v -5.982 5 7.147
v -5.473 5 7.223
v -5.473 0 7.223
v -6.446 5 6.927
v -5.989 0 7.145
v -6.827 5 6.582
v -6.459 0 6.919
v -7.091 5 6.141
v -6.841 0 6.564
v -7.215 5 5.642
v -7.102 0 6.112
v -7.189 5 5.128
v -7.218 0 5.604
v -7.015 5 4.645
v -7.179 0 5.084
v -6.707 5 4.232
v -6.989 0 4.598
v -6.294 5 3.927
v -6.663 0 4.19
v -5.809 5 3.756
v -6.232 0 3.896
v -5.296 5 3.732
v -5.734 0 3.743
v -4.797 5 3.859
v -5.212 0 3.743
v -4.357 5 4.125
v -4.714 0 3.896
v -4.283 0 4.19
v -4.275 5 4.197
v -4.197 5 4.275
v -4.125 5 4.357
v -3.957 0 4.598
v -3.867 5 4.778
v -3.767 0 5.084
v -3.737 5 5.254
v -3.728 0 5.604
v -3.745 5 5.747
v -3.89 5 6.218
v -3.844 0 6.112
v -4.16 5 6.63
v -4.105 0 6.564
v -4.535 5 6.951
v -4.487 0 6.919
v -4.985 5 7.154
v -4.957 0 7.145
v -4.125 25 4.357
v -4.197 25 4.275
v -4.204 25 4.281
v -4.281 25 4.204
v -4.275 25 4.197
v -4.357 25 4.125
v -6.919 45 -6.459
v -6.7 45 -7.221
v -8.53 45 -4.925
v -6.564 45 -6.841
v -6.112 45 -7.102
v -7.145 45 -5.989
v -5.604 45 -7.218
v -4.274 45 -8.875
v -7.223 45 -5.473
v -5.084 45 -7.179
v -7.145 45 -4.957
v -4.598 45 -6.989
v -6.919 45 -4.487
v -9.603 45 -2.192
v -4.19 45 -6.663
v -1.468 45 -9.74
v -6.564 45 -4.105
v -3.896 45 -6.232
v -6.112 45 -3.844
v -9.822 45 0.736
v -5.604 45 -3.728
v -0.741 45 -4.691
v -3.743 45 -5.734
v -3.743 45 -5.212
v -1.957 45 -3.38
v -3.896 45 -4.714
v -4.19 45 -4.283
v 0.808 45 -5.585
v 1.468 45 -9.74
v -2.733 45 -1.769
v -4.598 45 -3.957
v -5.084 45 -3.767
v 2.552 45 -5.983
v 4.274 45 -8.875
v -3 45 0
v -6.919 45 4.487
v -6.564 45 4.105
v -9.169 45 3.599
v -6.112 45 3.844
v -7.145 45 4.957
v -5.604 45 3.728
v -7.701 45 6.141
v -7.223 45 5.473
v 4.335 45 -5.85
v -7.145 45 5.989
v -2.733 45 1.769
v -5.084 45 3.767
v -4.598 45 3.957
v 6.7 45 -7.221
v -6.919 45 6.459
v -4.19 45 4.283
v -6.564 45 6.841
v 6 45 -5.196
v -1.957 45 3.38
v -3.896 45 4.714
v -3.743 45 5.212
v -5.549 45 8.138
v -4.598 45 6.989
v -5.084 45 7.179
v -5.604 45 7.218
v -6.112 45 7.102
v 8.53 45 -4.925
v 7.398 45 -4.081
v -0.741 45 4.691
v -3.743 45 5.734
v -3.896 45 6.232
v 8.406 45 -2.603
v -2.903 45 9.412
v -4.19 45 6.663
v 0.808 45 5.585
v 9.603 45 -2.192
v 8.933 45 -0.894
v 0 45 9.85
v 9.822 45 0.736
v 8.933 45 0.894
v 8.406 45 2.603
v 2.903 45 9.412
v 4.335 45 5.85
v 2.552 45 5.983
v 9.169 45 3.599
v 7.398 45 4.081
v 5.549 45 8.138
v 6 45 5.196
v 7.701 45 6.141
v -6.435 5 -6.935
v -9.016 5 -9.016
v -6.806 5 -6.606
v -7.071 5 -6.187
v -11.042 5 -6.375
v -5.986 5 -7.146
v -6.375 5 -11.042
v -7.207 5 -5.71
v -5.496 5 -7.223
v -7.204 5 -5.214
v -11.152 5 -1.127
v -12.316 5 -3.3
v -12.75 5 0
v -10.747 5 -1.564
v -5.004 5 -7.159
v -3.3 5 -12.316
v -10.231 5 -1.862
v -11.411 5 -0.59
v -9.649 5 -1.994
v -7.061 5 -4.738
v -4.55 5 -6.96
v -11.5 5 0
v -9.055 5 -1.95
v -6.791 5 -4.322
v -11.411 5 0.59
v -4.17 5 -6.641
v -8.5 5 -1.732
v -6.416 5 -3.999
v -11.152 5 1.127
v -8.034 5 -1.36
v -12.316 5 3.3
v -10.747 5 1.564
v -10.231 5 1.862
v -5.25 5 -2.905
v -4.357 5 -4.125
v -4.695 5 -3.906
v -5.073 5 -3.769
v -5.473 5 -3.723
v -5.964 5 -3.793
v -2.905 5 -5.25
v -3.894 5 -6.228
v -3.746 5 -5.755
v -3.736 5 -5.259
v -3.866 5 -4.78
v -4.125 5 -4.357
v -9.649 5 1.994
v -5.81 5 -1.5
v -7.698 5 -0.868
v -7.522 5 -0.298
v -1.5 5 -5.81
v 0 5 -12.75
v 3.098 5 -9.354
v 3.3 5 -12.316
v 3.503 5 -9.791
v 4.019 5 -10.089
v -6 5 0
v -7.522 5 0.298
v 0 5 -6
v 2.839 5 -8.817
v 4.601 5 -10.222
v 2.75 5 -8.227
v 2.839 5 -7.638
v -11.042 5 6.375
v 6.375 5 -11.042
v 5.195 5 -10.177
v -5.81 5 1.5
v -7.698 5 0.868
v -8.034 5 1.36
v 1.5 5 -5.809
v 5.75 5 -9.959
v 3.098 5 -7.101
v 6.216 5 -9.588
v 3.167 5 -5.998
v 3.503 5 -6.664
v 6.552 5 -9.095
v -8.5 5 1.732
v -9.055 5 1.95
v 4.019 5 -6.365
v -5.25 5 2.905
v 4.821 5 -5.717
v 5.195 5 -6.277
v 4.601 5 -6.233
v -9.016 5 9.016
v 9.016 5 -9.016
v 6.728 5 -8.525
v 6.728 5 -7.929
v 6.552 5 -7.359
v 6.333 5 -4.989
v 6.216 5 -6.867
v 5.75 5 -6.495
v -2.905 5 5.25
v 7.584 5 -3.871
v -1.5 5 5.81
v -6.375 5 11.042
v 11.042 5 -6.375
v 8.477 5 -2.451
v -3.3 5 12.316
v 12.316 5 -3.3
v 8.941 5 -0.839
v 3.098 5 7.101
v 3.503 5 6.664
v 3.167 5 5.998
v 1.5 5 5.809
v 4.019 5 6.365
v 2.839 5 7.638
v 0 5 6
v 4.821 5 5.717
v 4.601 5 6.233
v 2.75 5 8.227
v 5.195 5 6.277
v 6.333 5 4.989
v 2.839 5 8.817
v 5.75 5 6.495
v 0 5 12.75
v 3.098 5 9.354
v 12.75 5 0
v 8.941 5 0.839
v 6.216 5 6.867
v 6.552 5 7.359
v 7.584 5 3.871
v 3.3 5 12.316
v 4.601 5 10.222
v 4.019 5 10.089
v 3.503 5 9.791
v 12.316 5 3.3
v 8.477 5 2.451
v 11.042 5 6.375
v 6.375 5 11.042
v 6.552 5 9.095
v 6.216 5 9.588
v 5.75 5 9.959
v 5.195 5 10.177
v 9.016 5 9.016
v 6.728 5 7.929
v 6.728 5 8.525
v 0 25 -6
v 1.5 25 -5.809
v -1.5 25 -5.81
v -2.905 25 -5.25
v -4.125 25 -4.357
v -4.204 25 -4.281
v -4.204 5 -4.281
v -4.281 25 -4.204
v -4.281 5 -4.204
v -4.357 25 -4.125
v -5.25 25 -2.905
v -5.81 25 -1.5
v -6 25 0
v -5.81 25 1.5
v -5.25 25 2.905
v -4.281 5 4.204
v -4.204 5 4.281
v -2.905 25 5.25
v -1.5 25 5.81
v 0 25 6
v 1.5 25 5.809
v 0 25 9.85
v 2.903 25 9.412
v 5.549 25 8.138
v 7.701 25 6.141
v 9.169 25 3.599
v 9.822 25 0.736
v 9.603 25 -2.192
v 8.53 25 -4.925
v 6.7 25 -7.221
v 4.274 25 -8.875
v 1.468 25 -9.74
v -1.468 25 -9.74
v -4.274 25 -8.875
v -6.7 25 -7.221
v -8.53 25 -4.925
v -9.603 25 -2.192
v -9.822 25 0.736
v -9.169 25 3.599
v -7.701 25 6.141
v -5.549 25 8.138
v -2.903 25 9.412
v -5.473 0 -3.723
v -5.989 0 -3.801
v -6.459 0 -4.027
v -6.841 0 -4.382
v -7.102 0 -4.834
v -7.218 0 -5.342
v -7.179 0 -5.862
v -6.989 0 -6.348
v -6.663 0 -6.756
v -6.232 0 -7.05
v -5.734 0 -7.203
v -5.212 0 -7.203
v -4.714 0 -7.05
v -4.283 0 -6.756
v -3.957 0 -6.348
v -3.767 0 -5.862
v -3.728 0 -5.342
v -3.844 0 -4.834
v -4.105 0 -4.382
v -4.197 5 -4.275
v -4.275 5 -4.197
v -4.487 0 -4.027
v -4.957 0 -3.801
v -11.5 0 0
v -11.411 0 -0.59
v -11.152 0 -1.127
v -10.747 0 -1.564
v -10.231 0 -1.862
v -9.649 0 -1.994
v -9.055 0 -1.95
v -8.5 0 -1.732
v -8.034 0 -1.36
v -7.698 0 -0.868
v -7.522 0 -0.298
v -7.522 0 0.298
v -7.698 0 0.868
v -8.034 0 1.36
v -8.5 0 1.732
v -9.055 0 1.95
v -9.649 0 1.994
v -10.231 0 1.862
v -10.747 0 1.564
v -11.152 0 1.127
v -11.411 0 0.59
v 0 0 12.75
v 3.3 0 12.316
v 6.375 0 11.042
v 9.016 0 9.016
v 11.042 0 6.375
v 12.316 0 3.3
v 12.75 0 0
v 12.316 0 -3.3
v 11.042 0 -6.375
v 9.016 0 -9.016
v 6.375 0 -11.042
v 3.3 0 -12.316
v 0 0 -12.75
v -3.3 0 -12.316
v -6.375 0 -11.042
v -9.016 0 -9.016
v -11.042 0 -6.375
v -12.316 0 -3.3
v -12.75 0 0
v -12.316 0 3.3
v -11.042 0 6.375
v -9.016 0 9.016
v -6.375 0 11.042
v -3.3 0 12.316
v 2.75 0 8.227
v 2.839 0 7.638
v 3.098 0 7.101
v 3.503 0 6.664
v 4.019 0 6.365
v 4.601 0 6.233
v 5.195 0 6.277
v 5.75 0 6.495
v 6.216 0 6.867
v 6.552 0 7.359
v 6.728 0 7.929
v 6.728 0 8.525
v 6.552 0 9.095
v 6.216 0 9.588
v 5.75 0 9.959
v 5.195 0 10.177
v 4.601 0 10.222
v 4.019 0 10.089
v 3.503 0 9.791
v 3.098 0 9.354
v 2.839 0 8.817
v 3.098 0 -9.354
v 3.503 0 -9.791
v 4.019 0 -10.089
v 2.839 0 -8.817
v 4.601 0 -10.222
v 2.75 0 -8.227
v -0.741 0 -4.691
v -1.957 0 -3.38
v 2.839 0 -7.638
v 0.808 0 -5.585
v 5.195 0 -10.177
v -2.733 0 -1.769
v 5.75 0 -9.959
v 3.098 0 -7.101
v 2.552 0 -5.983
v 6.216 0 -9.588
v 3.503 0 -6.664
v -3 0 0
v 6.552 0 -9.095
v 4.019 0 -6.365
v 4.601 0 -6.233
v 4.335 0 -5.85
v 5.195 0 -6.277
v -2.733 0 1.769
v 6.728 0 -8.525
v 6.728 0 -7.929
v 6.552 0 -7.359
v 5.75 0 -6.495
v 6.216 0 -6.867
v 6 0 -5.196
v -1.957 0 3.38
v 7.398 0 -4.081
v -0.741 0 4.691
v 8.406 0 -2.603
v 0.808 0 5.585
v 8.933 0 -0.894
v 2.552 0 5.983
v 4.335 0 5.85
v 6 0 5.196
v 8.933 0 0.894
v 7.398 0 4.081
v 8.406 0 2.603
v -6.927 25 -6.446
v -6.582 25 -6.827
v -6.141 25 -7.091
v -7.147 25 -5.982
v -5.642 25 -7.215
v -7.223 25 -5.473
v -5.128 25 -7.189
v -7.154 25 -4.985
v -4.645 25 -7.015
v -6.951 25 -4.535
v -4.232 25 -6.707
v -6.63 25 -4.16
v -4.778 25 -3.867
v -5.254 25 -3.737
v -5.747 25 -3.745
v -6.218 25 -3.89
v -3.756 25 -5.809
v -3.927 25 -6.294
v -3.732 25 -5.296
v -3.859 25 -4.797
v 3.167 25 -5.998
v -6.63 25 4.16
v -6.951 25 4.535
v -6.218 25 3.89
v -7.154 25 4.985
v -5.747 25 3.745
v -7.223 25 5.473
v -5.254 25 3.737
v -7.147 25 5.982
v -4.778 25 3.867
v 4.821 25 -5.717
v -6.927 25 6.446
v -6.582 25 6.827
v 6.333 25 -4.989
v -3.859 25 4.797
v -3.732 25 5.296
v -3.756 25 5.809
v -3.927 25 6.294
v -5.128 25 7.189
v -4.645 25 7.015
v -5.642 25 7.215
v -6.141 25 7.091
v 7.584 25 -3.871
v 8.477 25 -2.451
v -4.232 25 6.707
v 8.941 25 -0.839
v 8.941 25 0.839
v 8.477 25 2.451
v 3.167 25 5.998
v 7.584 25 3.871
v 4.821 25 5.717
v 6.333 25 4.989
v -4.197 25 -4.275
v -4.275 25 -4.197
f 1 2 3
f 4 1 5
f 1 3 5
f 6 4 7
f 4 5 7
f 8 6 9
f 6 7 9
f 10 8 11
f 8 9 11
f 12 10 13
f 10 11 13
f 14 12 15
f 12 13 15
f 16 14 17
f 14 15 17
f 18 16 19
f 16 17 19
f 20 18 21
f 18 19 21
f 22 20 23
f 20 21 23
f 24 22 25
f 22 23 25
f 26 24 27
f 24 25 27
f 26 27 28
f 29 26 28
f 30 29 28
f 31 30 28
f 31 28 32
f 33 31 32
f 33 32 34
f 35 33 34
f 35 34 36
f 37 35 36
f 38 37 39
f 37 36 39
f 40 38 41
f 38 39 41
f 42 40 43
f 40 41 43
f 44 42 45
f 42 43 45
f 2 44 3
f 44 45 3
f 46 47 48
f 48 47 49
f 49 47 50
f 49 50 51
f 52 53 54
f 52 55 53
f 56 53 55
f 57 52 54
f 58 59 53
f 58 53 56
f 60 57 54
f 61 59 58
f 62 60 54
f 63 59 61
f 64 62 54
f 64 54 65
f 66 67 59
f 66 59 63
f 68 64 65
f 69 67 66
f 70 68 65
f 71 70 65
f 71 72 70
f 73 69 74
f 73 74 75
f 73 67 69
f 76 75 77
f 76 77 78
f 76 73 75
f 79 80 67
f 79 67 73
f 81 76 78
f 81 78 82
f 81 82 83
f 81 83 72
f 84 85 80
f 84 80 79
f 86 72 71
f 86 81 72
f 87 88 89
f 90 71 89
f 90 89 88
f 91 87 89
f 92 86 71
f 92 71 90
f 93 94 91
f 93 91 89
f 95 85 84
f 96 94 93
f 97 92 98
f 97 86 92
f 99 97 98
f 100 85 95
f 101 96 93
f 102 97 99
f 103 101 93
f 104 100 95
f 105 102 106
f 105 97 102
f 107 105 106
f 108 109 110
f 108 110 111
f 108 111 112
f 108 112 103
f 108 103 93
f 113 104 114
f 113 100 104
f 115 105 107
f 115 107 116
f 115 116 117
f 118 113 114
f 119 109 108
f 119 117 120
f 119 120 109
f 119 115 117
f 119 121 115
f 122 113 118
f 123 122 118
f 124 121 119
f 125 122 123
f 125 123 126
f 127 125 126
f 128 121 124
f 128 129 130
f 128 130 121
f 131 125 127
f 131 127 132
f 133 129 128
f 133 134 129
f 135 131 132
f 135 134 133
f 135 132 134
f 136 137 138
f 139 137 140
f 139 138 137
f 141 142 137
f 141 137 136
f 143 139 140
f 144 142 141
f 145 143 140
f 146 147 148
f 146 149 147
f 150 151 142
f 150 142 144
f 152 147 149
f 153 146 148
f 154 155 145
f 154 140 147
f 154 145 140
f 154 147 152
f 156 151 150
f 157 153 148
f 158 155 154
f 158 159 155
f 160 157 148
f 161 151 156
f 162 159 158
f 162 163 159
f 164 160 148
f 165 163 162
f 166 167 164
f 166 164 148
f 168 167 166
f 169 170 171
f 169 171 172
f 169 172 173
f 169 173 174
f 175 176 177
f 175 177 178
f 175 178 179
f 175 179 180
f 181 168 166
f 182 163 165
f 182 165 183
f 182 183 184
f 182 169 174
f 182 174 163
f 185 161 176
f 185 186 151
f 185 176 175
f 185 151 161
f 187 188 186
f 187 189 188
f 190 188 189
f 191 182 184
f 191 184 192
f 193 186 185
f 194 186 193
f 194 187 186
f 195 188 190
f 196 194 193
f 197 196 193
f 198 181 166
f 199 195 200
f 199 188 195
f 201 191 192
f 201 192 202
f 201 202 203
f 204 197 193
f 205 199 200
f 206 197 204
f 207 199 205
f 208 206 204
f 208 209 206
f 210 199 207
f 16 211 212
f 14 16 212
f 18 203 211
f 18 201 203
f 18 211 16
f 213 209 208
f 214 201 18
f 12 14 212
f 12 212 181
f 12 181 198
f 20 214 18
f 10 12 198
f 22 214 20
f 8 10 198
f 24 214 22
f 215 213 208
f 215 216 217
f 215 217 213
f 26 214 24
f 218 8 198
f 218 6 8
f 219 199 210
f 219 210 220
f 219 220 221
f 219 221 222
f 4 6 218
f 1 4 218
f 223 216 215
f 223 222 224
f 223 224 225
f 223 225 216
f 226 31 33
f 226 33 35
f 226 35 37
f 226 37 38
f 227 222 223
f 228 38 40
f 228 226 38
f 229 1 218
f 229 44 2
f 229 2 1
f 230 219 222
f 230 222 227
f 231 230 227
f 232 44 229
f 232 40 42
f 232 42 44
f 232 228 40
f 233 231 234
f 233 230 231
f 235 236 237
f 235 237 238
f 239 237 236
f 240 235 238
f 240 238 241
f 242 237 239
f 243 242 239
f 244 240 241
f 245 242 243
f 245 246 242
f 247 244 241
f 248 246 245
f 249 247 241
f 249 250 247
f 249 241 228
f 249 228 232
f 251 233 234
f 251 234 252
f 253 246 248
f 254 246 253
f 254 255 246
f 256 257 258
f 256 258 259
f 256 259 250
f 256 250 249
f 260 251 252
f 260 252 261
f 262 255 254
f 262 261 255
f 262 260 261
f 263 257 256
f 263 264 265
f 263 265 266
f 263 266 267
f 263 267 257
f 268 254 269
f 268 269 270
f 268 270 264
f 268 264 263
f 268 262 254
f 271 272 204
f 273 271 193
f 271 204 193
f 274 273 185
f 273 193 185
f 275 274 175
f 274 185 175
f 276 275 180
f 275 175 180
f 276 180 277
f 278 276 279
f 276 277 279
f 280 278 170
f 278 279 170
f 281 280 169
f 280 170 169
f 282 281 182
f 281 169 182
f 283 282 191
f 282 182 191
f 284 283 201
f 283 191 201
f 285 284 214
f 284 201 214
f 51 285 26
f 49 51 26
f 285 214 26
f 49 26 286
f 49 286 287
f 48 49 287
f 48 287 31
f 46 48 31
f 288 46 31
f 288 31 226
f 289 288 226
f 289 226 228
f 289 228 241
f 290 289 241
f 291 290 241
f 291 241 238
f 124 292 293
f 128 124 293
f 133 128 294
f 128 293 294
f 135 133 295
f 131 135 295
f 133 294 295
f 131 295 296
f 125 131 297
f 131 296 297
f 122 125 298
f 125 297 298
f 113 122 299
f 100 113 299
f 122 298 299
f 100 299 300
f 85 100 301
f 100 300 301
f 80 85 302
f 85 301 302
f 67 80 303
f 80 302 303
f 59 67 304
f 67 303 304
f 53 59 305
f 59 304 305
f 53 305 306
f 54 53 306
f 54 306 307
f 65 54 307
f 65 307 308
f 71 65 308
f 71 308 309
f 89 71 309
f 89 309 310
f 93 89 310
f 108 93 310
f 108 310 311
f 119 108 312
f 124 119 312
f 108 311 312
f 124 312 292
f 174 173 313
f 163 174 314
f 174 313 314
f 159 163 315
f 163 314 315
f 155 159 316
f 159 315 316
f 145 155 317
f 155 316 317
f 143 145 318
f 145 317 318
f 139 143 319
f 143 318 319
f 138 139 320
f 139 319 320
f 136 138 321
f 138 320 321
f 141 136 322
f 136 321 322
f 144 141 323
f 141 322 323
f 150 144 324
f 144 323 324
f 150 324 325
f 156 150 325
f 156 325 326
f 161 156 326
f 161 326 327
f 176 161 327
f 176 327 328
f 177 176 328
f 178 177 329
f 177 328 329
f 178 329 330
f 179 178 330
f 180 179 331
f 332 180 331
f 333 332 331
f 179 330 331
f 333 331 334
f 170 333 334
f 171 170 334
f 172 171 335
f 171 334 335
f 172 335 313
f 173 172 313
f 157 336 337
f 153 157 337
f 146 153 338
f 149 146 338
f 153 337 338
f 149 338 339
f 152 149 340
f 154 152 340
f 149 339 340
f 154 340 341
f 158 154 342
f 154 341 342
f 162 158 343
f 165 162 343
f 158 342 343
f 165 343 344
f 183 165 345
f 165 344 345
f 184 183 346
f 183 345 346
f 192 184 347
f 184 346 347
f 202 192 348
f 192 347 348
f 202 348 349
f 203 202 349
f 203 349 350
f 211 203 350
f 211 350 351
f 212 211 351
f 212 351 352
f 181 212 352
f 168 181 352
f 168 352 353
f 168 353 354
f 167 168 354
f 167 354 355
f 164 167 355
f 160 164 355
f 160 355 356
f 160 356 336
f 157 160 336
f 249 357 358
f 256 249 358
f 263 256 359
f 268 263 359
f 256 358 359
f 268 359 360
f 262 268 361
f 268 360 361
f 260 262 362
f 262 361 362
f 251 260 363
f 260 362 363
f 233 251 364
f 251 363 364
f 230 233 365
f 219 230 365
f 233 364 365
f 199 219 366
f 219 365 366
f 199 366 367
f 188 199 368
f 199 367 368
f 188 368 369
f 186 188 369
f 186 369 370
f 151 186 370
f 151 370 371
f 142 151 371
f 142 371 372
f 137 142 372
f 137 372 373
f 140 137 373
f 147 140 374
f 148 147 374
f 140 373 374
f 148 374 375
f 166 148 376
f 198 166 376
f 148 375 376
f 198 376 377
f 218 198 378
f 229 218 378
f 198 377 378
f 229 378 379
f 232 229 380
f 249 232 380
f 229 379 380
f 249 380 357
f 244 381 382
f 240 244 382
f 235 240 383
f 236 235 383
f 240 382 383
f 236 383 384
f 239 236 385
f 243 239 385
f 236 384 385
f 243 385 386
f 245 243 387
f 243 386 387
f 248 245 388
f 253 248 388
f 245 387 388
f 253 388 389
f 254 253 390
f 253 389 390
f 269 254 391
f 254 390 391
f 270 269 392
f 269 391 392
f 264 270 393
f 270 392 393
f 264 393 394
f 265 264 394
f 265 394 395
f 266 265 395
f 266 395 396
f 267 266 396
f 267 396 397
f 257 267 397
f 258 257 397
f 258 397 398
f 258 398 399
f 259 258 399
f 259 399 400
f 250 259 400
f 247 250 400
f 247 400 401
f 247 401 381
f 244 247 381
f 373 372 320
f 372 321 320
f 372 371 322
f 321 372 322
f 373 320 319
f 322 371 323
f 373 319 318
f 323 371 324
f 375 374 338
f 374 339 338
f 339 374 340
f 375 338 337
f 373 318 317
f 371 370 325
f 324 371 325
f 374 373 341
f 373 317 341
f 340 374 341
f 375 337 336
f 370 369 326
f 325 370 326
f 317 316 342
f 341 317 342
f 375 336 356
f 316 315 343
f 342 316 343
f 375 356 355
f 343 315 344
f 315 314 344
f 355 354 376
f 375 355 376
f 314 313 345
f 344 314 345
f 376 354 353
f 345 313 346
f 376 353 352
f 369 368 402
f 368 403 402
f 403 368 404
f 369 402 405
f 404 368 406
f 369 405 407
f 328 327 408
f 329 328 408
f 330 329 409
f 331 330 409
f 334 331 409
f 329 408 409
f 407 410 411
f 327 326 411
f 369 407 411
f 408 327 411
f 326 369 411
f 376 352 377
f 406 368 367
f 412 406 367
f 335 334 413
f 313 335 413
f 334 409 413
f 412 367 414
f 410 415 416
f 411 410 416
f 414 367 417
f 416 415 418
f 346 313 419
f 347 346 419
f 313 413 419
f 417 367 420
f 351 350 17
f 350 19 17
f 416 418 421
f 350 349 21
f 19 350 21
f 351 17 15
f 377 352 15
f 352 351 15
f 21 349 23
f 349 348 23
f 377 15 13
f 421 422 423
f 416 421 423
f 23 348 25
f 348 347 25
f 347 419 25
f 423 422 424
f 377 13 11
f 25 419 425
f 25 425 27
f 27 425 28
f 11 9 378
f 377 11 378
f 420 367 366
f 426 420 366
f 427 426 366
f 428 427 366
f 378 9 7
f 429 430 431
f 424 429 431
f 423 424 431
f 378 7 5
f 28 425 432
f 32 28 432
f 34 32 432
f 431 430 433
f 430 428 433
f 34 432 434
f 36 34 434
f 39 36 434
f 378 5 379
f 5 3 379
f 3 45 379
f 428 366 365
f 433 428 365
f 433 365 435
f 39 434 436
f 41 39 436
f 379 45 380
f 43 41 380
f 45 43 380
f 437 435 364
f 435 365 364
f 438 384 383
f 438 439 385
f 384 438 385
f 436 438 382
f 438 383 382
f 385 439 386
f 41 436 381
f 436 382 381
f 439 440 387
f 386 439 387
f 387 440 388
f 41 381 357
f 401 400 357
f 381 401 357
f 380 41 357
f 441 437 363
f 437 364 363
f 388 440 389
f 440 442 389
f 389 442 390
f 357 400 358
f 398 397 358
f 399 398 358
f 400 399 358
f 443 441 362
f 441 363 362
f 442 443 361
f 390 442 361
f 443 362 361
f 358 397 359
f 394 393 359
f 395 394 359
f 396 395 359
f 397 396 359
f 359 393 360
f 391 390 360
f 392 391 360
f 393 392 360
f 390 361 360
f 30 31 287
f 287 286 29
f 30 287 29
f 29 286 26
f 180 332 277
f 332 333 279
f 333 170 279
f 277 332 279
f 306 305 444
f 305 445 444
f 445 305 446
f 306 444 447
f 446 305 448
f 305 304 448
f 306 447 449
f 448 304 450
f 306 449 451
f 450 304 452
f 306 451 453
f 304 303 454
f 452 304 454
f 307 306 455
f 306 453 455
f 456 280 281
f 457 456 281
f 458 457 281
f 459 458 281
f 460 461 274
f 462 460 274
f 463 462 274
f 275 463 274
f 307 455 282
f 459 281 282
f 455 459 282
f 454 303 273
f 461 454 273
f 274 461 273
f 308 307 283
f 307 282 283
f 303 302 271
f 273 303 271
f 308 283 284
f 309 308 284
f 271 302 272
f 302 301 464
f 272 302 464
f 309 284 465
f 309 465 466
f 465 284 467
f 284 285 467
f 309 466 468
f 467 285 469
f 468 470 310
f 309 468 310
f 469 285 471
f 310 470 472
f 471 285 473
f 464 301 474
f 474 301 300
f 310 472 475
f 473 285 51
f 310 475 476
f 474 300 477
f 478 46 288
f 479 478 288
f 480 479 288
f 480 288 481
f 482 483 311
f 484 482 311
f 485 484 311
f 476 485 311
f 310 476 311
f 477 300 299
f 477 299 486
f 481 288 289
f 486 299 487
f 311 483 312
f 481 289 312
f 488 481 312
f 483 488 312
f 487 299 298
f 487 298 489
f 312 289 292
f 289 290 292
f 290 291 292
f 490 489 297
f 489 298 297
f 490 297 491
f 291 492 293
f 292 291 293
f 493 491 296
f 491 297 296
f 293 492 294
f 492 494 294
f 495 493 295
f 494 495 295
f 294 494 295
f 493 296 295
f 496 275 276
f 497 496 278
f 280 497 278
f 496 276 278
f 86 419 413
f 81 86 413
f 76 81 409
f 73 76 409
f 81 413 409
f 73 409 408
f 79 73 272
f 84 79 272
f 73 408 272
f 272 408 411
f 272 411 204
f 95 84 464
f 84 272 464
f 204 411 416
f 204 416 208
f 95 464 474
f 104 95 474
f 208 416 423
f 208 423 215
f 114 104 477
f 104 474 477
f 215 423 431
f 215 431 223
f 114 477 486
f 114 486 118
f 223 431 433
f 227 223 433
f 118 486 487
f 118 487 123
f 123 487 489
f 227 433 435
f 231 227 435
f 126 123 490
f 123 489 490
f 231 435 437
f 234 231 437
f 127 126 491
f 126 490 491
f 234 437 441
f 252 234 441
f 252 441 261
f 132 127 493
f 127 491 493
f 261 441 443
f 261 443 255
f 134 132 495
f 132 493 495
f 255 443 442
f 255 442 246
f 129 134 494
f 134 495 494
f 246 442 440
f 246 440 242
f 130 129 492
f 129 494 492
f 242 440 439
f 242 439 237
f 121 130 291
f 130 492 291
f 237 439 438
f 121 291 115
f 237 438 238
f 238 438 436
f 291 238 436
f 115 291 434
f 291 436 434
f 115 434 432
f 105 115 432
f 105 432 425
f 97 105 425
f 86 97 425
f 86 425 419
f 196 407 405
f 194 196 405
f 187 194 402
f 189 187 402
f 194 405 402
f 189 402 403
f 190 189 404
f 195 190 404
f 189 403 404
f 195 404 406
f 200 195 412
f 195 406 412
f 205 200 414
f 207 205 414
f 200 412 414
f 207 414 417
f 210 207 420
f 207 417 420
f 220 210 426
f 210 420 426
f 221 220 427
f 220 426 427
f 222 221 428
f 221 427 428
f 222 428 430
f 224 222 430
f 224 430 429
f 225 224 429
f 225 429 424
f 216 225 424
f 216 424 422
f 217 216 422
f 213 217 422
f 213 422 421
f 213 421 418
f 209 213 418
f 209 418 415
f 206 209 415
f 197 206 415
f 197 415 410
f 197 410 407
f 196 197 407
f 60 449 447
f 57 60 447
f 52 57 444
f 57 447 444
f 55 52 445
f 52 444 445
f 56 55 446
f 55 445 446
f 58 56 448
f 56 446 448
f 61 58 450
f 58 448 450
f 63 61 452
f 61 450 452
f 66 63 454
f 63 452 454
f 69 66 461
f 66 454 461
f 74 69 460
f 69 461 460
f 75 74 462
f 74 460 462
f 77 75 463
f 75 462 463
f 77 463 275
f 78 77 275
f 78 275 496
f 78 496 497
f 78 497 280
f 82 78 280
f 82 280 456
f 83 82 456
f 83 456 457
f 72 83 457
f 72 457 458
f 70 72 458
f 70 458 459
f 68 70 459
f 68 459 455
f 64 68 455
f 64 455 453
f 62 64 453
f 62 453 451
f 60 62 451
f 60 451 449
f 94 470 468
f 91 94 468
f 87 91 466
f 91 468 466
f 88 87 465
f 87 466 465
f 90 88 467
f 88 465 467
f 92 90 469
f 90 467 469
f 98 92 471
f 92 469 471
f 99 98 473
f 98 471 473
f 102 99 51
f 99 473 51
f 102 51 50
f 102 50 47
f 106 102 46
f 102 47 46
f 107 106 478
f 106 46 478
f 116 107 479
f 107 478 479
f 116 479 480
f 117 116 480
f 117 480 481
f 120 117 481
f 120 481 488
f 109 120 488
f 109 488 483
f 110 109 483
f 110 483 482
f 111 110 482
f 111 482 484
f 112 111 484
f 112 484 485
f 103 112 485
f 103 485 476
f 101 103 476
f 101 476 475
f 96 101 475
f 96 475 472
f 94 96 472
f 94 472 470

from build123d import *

# Parameters (mm, degrees)
SKETCH1_R                      = 12.75
BOSS_EXTRUDE1_DEPTH            = 5
F_6_0MM_DOWEL_HOLE1_D          = 4
SKETCH2_R                      = 6
BOSS_EXTRUDE2_DEPTH            = 20
SKETCH5_R                      = 9.85
BOSS_EXTRUDE3_DEPTH            = 20
F_6_0MM_DOWEL_HOLE2_D          = 12
F_6_0MM_DOWEL_HOLE3_D          = 3.5
F_6_0MM_DOWEL_HOLE3_DEPTH      = 20
SKETCH17_W                     = 1.75
SKETCH17_H                     = 5
F_6_0MM_DOWEL_HOLE4_AT_2_COUNT = 2
F_6_0MM_DOWEL_HOLE4_AT_2_PITCH = 10.946012973


with BuildPart() as part:
    # Sketch1 → Boss-Extrude1 (new body)
    with BuildSketch(Plane(origin=(0, 0, 0), x_dir=(1, 0, 0), z_dir=(0, 1, 0))):
        with Locations(Location((0, 0, 0), (0, 0, 270))):
            Circle(SKETCH1_R)
    extrude(amount=BOSS_EXTRUDE1_DEPTH)

    # Ø6.0mm Dowel Hole1 (through all)
    with Locations(Plane(origin=(0, 5, 0), x_dir=(1, 0, 0), z_dir=(0, 1, 0))):
        with Locations((-9.5, 0), (4.75, -8.227241336), (4.75, 8.227241336)):
            Hole(F_6_0MM_DOWEL_HOLE1_D / 2)

    # Sketch2 → Boss-Extrude2 (add)
    with BuildSketch(Plane(origin=(0, 5, 0), x_dir=(1, 0, 0), z_dir=(0, 1, 0))):
        with Locations(Location((0, 0, 0), (0, 0, 270))):
            Circle(SKETCH2_R)
    extrude(amount=BOSS_EXTRUDE2_DEPTH)

    # Sketch5 → Boss-Extrude3 (add)
    with BuildSketch(Plane(origin=(0, 25, 0), x_dir=(1, 0, 0), z_dir=(0, 1, 0))):
        with Locations(Location((0, 0, 0), (0, 0, 270))):
            Circle(SKETCH5_R)
    extrude(amount=BOSS_EXTRUDE3_DEPTH)

    # Ø6.0mm Dowel Hole2 (through all)
    with Locations(Plane(origin=(0, 45, 0), x_dir=(1, 0, 0), z_dir=(0, 1, 0))):
        with Locations((3, 0)):
            Hole(F_6_0MM_DOWEL_HOLE2_D / 2)

    # Ø6.0mm Dowel Hole3
    with Locations(Plane(origin=(0, 45, 0), x_dir=(1, 0, 0), z_dir=(0, 1, 0))):
        with Locations((-5.473006486, 5.473006486), (-5.473006486, -5.473006486)):
            Hole(F_6_0MM_DOWEL_HOLE3_D / 2, depth=F_6_0MM_DOWEL_HOLE3_DEPTH)

    # Sketch17 → Ø6.0mm Dowel Hole4 (revolve, cut)
    with BuildSketch(Plane(origin=(-5.473006486, 5, 5.473006486), x_dir=(0, 0, 1), z_dir=(1, 0, 0))):
        with Locations((0.875, 2.5)):
            Rectangle(SKETCH17_W, SKETCH17_H)
    f_6_0mm_dowel_hole4 = revolve(axis=Axis((-5.473006486, 11.35, 5.473006486), (0, -1, 0)), mode=Mode.SUBTRACT)

    # Ø6.0mm Dowel Hole4 at 2: Ø6.0mm Dowel Hole4 ×2
    with Locations(*[(0, 0, -i * F_6_0MM_DOWEL_HOLE4_AT_2_PITCH) for i in range(1, F_6_0MM_DOWEL_HOLE4_AT_2_COUNT)]):
        add(f_6_0mm_dowel_hole4, mode=Mode.SUBTRACT)


solid = part.part
